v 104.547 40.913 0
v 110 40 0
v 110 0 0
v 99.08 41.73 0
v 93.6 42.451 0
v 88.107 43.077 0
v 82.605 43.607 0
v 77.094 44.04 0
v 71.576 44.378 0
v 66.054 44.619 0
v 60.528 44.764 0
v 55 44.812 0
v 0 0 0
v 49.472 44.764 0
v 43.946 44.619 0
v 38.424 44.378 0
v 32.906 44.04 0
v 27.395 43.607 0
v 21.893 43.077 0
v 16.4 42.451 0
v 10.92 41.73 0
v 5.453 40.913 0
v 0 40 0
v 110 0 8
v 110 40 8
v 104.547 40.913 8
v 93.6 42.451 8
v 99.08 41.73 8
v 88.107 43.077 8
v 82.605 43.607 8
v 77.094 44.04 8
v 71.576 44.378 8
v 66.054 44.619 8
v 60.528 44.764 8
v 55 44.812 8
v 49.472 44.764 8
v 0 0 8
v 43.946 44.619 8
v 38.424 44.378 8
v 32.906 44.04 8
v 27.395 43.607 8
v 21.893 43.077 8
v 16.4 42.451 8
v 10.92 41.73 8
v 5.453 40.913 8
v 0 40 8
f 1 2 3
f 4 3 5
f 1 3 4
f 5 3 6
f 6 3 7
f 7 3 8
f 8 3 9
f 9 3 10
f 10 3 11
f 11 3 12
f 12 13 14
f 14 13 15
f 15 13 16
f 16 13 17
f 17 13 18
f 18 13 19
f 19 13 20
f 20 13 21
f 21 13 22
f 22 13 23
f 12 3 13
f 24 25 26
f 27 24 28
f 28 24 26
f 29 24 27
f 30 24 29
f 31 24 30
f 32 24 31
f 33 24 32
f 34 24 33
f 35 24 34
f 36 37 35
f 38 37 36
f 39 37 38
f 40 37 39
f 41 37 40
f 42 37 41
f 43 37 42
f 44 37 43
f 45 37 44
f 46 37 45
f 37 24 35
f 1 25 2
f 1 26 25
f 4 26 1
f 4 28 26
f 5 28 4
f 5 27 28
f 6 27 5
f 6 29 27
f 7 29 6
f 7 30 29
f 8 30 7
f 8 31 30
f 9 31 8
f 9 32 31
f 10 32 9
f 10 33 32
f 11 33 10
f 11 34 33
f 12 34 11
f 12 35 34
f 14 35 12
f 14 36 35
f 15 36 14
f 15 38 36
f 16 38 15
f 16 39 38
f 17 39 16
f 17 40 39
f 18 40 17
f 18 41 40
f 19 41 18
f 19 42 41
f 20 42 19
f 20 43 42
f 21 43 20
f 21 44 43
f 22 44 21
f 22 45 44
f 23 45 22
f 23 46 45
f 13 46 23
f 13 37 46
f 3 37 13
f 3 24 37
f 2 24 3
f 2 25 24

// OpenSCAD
$fn = 32;

// ----------------------------------------------------------------------
// Arc profile plate: crown, 23 points
// ----------------------------------------------------------------------

// --- parameters (mm) ---
bar_l = 110;              // bar length, X
bar_w = 40;               // bar height at the ends, Y
arc_r = 316.73;           // radius of the crown arc
arc_angle = 20;           // crown arc angle, degrees
crown_rise = 4.81;        // rise of the crown over the ends
arc_step = 1;             // sampling step of the crown arc, degrees
plate_t = 8;              // plate thickness, Z

bbox_y = bar_w + crown_rise;  // full height with the crown

profile = [[110, 40], [104.547, 40.913], [99.08, 41.73], [93.6, 42.451], [88.107, 43.077], [82.605, 43.607], [77.094, 44.04], [71.576, 44.378], [66.054, 44.619], [60.528, 44.764], [55, 44.812], [49.472, 44.764], [43.946, 44.619], [38.424, 44.378], [32.906, 44.04], [27.395, 43.607], [21.893, 43.077], [16.4, 42.451], [10.92, 41.73], [5.453, 40.913], [0, 40], [0, 0], [110, 0]];  // primary outline, 23 points, counter clockwise

// --- the one profile operation ---
linear_extrude(height = plate_t) polygon(points = profile);
